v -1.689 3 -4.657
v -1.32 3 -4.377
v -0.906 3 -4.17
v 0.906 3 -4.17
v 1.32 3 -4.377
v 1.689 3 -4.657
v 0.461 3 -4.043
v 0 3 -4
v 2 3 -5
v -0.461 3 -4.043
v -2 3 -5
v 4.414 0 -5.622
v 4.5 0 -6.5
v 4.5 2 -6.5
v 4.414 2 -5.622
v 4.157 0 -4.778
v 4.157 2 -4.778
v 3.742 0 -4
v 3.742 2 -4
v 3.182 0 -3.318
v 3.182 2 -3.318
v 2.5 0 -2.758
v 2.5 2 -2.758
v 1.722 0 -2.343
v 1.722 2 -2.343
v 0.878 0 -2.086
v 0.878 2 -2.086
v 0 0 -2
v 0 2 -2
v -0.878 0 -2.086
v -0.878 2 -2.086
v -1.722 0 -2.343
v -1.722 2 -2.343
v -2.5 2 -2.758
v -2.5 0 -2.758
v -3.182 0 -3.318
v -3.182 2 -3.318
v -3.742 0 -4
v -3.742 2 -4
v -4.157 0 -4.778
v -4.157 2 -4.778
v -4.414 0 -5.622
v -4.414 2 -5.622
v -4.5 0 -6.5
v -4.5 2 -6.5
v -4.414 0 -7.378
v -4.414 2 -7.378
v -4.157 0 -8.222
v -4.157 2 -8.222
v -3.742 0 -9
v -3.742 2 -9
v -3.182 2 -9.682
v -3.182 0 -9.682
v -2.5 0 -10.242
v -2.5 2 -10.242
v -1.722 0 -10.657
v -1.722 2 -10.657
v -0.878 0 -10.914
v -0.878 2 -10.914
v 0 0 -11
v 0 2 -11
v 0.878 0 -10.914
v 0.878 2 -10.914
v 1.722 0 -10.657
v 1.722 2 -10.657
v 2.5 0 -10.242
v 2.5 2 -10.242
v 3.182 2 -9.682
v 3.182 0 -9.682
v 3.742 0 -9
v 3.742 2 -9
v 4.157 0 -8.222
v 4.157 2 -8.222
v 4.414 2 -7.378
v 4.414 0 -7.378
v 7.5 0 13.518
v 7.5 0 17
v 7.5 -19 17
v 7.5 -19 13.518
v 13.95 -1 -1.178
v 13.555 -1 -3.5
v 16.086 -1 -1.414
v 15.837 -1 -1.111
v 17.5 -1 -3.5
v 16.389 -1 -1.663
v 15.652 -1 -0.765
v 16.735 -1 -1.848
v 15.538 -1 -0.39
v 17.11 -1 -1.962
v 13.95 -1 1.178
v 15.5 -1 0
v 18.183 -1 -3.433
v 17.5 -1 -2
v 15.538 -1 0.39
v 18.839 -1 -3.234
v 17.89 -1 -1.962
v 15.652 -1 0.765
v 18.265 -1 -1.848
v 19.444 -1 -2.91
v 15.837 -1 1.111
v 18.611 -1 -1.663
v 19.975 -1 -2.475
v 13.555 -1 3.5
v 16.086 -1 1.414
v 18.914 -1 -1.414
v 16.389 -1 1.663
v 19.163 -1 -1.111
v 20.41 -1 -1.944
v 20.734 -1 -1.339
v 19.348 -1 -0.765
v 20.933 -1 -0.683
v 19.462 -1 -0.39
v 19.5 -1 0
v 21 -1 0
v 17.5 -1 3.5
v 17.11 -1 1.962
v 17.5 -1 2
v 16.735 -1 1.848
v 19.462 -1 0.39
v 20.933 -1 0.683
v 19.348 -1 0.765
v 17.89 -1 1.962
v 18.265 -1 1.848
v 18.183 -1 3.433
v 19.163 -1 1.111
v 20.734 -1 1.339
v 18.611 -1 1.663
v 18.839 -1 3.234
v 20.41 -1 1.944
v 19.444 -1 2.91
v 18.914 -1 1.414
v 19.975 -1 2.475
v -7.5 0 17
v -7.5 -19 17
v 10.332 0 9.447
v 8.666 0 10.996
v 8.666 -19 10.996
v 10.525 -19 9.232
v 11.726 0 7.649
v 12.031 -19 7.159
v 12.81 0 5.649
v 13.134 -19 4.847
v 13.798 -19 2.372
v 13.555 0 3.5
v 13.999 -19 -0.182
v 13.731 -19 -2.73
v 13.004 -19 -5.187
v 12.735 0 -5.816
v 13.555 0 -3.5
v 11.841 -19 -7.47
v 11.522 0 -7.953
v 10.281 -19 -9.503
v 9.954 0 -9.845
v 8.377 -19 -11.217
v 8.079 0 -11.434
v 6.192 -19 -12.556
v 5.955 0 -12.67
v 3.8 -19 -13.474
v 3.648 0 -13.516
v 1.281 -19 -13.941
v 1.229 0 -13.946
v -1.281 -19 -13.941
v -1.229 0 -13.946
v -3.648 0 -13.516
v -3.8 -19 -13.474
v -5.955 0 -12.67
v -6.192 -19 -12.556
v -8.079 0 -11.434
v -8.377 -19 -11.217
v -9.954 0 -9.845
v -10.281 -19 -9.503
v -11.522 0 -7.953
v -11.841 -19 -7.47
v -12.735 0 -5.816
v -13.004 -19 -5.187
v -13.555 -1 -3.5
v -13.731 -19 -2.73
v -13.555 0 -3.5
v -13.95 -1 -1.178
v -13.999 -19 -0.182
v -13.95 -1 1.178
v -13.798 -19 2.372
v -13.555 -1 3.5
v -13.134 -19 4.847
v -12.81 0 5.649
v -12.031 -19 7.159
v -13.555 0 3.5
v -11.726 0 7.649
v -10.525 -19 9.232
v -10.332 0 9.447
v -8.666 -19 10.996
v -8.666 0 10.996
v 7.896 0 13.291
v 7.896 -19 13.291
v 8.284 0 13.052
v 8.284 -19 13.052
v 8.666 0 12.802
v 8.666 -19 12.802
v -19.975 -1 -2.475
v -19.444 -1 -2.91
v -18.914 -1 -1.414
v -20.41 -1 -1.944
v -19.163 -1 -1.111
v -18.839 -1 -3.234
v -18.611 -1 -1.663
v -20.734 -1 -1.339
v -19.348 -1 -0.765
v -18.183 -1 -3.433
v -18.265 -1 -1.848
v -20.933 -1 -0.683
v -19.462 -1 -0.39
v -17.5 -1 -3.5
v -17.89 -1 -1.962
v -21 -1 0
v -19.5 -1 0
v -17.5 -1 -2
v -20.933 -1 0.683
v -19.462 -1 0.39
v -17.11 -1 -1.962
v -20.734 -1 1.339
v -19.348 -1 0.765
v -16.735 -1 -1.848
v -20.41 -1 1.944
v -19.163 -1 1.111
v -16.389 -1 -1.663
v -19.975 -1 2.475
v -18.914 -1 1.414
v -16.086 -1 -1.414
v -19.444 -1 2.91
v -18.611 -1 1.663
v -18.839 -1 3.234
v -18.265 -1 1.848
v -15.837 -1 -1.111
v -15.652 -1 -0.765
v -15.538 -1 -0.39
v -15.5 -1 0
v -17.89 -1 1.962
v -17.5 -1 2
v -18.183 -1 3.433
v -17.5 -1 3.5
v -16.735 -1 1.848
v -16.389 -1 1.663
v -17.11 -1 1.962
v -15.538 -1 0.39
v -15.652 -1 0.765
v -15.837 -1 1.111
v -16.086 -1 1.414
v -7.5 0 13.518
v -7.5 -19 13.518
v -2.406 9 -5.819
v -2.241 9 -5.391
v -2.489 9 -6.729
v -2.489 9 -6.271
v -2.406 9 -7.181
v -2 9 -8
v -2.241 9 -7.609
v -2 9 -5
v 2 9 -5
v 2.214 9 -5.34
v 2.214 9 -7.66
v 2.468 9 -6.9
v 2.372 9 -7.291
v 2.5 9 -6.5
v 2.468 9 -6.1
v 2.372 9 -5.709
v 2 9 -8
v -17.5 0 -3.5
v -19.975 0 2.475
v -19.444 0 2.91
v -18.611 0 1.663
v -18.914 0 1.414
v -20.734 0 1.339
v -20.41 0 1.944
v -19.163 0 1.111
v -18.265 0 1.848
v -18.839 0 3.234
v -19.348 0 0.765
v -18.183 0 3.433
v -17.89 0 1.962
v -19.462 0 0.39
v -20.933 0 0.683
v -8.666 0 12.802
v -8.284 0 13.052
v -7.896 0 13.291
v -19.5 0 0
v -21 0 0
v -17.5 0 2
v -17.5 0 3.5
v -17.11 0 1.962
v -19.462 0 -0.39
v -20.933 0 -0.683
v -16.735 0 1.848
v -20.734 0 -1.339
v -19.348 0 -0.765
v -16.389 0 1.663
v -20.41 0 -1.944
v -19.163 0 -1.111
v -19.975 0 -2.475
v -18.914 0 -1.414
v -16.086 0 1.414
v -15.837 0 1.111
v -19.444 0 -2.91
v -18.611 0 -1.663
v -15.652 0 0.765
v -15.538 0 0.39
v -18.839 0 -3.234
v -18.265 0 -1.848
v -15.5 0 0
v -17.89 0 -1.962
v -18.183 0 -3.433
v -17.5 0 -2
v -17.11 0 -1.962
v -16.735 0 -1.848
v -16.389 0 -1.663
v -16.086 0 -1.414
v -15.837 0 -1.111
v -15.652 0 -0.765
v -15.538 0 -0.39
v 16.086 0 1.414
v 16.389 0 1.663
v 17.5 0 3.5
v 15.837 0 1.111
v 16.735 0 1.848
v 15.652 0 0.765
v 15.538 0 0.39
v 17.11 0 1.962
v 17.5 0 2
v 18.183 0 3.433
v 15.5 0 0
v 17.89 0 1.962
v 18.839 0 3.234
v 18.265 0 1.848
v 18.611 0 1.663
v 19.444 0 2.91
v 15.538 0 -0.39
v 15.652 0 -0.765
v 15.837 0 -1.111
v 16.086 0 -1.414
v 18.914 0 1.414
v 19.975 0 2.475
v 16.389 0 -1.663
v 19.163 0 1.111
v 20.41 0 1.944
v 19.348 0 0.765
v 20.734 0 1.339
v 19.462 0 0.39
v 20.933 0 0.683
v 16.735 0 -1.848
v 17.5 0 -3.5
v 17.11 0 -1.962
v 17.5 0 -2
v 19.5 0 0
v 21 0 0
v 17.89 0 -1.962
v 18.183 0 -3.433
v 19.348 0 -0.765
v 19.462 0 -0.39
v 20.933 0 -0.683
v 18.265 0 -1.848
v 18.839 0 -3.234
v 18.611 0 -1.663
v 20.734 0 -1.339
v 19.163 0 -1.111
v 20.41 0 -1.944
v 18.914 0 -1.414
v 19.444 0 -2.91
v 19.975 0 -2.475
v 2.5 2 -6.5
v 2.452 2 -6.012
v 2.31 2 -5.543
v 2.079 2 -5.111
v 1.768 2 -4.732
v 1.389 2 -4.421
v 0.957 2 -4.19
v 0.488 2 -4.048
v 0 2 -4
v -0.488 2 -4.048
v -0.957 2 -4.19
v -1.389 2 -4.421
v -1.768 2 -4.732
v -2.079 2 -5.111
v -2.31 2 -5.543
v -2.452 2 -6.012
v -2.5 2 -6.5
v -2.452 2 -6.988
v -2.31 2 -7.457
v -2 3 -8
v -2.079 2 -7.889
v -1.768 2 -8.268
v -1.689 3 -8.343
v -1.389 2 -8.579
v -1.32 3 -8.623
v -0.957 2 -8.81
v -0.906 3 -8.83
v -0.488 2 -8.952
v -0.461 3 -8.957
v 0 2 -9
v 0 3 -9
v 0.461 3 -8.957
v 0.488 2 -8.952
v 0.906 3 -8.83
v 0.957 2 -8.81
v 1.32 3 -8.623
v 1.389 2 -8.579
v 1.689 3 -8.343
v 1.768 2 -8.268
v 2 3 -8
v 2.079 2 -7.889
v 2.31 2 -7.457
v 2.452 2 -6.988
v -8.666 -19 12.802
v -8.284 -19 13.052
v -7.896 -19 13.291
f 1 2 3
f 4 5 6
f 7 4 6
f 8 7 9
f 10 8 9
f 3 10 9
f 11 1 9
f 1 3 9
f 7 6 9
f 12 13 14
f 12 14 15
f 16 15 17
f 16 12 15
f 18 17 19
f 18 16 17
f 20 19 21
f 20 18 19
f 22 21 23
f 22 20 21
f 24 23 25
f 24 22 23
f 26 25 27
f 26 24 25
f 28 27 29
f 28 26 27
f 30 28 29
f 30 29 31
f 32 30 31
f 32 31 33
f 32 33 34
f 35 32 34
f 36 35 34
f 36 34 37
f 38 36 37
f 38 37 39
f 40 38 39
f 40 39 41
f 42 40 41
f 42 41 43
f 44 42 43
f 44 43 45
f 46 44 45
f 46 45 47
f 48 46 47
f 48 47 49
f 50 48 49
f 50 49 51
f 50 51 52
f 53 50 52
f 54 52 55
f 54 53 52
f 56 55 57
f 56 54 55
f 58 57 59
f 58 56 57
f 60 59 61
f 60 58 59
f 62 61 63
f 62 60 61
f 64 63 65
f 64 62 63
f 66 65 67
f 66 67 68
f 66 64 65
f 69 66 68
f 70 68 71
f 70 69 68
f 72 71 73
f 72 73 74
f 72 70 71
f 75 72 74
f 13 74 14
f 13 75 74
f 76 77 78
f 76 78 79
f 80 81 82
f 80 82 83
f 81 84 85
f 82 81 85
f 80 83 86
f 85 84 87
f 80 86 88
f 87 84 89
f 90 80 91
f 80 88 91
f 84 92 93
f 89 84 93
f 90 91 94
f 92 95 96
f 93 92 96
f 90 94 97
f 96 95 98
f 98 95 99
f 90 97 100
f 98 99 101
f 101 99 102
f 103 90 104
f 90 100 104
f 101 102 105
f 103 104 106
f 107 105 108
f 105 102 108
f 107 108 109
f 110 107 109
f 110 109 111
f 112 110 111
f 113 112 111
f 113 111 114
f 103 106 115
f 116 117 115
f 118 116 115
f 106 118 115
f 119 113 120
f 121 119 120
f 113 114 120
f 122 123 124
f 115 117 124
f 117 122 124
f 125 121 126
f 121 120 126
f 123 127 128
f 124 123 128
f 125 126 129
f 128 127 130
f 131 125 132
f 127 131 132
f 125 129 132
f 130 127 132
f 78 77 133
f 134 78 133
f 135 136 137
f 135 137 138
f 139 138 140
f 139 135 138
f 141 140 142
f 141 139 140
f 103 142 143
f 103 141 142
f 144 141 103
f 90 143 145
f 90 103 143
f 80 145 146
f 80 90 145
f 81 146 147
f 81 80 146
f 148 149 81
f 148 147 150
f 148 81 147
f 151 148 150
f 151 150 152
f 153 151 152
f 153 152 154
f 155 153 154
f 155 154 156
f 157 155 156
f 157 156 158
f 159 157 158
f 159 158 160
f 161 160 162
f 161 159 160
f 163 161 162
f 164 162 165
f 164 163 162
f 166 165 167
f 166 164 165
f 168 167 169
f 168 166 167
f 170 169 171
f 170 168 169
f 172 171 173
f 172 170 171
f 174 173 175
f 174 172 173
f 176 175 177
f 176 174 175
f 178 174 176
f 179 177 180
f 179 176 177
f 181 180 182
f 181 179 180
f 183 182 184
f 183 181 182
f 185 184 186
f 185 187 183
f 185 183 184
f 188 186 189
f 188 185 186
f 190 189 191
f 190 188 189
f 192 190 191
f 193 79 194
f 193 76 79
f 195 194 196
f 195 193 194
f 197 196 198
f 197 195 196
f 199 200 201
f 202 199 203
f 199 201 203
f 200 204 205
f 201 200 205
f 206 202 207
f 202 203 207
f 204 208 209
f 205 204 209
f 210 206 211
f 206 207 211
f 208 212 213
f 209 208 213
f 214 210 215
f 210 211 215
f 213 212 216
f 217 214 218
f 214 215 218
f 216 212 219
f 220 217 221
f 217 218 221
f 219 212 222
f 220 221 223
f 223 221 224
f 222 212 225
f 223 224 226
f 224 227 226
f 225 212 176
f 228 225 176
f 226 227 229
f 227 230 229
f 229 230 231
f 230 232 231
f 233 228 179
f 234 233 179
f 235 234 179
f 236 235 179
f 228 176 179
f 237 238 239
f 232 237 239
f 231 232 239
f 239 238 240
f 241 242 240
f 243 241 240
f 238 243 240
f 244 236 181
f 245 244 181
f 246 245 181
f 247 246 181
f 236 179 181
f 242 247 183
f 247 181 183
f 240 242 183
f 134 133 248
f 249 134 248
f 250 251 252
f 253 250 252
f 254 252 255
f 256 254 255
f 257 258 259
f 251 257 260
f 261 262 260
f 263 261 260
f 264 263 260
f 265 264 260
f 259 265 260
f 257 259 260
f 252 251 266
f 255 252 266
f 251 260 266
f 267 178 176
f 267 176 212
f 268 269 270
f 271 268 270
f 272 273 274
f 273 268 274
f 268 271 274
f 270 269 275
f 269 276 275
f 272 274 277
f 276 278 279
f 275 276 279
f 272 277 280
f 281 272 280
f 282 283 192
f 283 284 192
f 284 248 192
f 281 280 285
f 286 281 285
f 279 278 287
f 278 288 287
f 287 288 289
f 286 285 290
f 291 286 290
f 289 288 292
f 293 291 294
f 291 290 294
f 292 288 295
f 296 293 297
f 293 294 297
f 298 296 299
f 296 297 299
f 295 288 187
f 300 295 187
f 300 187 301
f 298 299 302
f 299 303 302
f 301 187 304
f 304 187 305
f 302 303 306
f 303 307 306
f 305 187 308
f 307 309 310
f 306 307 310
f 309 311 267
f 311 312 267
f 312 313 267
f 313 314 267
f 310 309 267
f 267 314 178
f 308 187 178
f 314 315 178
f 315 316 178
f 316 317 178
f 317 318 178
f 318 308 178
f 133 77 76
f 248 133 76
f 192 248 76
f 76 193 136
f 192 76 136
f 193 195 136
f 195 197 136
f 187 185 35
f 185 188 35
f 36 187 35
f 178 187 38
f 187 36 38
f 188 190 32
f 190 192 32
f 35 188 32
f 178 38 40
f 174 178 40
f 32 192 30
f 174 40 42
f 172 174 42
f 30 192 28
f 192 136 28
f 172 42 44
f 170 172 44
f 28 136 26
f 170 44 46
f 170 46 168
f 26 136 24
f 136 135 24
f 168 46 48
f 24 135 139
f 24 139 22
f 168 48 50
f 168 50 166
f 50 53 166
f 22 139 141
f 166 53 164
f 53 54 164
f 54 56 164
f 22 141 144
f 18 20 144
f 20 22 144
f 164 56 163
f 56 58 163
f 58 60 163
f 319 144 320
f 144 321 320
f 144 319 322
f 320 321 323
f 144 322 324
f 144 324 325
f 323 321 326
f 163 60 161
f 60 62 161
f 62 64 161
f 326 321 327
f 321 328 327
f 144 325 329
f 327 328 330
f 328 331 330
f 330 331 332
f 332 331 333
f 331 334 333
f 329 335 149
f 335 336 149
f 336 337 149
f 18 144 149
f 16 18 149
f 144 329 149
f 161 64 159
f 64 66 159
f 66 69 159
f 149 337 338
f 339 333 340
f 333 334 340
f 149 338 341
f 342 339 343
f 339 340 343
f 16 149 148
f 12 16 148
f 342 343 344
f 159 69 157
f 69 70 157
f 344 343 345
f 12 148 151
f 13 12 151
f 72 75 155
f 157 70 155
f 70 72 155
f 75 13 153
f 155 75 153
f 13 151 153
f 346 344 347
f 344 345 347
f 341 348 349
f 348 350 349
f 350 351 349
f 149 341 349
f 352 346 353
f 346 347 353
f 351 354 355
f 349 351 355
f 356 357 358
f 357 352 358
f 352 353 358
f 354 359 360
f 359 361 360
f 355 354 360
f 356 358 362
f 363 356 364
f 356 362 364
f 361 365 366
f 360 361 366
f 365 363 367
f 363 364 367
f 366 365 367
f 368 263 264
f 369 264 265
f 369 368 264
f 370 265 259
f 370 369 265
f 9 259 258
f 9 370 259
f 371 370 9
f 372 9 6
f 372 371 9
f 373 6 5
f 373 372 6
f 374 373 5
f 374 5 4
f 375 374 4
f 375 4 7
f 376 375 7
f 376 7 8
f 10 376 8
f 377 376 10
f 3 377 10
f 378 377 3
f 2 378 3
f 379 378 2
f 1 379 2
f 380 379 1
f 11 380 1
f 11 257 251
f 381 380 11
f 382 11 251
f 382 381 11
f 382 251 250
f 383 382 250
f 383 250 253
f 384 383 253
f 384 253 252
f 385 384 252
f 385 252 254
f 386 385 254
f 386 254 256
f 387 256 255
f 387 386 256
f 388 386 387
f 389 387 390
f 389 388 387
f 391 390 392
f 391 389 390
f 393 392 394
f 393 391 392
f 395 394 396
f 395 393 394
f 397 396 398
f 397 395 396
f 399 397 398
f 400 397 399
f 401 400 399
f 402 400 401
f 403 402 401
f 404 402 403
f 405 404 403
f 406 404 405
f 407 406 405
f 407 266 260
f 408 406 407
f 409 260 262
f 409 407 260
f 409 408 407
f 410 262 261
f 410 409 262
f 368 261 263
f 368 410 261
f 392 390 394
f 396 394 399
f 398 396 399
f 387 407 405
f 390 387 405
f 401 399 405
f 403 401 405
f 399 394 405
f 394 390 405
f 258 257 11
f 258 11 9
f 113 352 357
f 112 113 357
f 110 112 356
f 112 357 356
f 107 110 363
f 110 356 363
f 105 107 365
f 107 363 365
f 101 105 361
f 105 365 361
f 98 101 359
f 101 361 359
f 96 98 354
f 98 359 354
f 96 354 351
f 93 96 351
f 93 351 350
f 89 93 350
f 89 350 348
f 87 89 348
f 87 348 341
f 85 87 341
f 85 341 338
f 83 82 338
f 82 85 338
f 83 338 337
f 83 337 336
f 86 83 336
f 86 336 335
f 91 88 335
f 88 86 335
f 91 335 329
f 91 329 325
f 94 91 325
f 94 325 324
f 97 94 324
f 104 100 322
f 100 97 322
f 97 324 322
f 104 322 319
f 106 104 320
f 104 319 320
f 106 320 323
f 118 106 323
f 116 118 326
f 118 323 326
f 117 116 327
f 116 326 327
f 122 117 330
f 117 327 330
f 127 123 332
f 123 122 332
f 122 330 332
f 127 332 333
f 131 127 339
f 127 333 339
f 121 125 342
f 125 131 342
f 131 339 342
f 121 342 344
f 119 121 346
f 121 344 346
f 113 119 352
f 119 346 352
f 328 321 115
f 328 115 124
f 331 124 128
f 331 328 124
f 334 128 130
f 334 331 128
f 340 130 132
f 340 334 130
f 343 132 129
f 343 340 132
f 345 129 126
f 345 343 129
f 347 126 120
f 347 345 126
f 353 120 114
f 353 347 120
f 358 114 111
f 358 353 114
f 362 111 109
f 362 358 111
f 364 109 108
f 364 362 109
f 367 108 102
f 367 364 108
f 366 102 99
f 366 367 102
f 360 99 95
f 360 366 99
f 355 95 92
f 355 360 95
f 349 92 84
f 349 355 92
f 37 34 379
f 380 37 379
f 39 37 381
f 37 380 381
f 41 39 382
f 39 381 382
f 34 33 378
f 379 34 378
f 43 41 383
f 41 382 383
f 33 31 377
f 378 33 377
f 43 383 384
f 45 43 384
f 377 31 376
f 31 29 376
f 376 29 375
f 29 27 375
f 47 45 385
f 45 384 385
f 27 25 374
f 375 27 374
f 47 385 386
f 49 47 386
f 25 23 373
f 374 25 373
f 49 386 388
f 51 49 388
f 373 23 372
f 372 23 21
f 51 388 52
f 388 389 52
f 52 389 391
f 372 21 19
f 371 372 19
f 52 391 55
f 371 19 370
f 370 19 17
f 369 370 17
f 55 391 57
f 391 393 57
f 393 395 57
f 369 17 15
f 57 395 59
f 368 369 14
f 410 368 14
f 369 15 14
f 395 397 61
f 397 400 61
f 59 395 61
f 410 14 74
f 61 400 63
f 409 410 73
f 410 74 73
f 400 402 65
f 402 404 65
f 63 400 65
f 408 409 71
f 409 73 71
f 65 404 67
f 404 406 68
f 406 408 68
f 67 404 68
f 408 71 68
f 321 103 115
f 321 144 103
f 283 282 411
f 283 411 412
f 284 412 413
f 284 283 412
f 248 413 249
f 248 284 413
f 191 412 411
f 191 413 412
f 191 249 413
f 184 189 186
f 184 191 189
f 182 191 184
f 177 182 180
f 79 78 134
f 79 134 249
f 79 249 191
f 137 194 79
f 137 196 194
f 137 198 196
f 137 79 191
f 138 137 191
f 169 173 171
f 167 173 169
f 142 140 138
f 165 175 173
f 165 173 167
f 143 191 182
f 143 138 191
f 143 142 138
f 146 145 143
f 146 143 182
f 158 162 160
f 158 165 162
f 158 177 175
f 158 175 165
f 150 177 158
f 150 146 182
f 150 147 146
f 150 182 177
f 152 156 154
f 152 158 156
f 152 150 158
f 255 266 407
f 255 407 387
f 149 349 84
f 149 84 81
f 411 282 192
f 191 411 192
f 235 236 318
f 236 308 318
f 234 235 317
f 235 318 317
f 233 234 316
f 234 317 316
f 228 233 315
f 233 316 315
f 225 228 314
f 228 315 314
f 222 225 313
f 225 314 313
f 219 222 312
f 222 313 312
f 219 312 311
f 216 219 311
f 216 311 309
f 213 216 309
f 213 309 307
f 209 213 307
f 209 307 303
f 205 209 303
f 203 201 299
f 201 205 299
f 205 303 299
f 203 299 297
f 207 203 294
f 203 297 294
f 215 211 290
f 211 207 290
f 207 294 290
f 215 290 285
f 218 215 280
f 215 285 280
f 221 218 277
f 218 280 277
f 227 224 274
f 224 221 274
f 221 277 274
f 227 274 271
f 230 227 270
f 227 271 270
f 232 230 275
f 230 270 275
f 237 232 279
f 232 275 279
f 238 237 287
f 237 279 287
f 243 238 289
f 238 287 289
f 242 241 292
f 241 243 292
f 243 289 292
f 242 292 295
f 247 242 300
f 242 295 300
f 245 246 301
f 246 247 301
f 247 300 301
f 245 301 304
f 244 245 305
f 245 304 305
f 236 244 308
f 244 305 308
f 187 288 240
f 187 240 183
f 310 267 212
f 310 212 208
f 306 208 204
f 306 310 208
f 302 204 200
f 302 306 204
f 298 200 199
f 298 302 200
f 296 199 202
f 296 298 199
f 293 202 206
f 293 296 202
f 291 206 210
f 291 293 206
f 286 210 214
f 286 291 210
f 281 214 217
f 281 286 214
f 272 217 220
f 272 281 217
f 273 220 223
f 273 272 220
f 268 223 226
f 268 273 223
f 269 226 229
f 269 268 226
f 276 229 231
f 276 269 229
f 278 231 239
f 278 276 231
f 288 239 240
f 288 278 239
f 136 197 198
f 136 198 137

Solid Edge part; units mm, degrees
sketch "Sketch1" plane through (0, 0, 0) normal (0, -1, 0) x (1, 0, 0)
  line L0 (0, 17) -> (-7.5, 17)
  line L1 (-7.5, 17) -> (-7.5, 13.5178)
  arc A0 (-8.6659, 12.8017) -> (-7.5, 13.5178) centre (0, 0) cw
  line L2 (-8.6659, 12.8017) -> (-8.6659, 10.9956)
  line L3 (8.6659, 12.8017) -> (8.6659, 10.9956)
  line L4 (7.5, 17) -> (7.5, 13.5178)
  line L5 (7.5, 17) -> (0, 17)
  arc A1 (8.6659, 10.9956) -> (-8.6659, 10.9956) centre (0, 0) cw
  arc A2 (7.5, 13.5178) -> (8.6659, 12.8017) centre (0, 0) cw
extrude "Protrusion1" add sketch "Sketch1" along normal blind 19
sketch "Sketch2" plane through (0, 0, 0) normal (0, -1, 0) x (1, 0, 0)
  line L0 (-17.5, 3.5) -> (-13.5554, 3.5)
  line L1 (-13.5554, 3.5) -> (-13.5554, -3.5)
  line L2 (-13.5554, -3.5) -> (-17.5, -3.5)
  arc A0 (-17.5, -3.5) -> (-17.5, 3.5) centre (-17.5, 0) cw
  circle A1 centre (-17.5, 0) radius 2
  line L3 (17.5, -3.5) -> (13.5554, -3.5)
  line L4 (13.5554, 3.5) -> (13.5554, -3.5)
  line L5 (13.5554, 3.5) -> (17.5, 3.5)
  arc A2 (17.5, 3.5) -> (17.5, -3.5) centre (17.5, 0) cw
  circle A3 centre (17.5, 0) radius 2
extrude "ProtrusiónExtruida_2" add sketch "Sketch2" along normal blind 1
sketch "Sketch3" plane through (0, 0, 0) normal (0, -1, 0) x (1, 0, 0)
  circle A0 centre (0, -6.5) radius 4.5
extrude "ProtrusiónExtruida_3" add sketch "Sketch3" against normal blind 2
sketch "Sketch4" plane through (0, 0, 0) normal (0, -1, 0) x (1, 0, 0)
  circle A0 centre (0, -6.5) radius 2.5
extrude "ProtrusiónExtruida_4" add sketch "Sketch4" against normal blind 9
sketch "Sketch5" plane through (0, 9, -6.5) normal (0, 1, 0) x (-1, 0, 0)
  line L0 (3.0106, 1.5) -> (-3.0106, 1.5)
  line L1 (-3.0106, 1.5) -> (-3.0106, 2.8857)
  line L2 (-3.0106, 2.8857) -> (3.0106, 2.8857)
  line L3 (3.0106, 2.8857) -> (3.0106, 1.5)
  line L4 (-3.0106, -1.5) -> (3.0106, -1.5)
  line L5 (3.0106, -1.5) -> (3.0106, -2.7741)
  line L6 (3.0106, -2.7741) -> (-3.0106, -2.7741)
  line L7 (-3.0106, -2.7741) -> (-3.0106, -1.5)
extrude "VaciadoExtruido_1" cut sketch "Sketch5" against normal blind 6
